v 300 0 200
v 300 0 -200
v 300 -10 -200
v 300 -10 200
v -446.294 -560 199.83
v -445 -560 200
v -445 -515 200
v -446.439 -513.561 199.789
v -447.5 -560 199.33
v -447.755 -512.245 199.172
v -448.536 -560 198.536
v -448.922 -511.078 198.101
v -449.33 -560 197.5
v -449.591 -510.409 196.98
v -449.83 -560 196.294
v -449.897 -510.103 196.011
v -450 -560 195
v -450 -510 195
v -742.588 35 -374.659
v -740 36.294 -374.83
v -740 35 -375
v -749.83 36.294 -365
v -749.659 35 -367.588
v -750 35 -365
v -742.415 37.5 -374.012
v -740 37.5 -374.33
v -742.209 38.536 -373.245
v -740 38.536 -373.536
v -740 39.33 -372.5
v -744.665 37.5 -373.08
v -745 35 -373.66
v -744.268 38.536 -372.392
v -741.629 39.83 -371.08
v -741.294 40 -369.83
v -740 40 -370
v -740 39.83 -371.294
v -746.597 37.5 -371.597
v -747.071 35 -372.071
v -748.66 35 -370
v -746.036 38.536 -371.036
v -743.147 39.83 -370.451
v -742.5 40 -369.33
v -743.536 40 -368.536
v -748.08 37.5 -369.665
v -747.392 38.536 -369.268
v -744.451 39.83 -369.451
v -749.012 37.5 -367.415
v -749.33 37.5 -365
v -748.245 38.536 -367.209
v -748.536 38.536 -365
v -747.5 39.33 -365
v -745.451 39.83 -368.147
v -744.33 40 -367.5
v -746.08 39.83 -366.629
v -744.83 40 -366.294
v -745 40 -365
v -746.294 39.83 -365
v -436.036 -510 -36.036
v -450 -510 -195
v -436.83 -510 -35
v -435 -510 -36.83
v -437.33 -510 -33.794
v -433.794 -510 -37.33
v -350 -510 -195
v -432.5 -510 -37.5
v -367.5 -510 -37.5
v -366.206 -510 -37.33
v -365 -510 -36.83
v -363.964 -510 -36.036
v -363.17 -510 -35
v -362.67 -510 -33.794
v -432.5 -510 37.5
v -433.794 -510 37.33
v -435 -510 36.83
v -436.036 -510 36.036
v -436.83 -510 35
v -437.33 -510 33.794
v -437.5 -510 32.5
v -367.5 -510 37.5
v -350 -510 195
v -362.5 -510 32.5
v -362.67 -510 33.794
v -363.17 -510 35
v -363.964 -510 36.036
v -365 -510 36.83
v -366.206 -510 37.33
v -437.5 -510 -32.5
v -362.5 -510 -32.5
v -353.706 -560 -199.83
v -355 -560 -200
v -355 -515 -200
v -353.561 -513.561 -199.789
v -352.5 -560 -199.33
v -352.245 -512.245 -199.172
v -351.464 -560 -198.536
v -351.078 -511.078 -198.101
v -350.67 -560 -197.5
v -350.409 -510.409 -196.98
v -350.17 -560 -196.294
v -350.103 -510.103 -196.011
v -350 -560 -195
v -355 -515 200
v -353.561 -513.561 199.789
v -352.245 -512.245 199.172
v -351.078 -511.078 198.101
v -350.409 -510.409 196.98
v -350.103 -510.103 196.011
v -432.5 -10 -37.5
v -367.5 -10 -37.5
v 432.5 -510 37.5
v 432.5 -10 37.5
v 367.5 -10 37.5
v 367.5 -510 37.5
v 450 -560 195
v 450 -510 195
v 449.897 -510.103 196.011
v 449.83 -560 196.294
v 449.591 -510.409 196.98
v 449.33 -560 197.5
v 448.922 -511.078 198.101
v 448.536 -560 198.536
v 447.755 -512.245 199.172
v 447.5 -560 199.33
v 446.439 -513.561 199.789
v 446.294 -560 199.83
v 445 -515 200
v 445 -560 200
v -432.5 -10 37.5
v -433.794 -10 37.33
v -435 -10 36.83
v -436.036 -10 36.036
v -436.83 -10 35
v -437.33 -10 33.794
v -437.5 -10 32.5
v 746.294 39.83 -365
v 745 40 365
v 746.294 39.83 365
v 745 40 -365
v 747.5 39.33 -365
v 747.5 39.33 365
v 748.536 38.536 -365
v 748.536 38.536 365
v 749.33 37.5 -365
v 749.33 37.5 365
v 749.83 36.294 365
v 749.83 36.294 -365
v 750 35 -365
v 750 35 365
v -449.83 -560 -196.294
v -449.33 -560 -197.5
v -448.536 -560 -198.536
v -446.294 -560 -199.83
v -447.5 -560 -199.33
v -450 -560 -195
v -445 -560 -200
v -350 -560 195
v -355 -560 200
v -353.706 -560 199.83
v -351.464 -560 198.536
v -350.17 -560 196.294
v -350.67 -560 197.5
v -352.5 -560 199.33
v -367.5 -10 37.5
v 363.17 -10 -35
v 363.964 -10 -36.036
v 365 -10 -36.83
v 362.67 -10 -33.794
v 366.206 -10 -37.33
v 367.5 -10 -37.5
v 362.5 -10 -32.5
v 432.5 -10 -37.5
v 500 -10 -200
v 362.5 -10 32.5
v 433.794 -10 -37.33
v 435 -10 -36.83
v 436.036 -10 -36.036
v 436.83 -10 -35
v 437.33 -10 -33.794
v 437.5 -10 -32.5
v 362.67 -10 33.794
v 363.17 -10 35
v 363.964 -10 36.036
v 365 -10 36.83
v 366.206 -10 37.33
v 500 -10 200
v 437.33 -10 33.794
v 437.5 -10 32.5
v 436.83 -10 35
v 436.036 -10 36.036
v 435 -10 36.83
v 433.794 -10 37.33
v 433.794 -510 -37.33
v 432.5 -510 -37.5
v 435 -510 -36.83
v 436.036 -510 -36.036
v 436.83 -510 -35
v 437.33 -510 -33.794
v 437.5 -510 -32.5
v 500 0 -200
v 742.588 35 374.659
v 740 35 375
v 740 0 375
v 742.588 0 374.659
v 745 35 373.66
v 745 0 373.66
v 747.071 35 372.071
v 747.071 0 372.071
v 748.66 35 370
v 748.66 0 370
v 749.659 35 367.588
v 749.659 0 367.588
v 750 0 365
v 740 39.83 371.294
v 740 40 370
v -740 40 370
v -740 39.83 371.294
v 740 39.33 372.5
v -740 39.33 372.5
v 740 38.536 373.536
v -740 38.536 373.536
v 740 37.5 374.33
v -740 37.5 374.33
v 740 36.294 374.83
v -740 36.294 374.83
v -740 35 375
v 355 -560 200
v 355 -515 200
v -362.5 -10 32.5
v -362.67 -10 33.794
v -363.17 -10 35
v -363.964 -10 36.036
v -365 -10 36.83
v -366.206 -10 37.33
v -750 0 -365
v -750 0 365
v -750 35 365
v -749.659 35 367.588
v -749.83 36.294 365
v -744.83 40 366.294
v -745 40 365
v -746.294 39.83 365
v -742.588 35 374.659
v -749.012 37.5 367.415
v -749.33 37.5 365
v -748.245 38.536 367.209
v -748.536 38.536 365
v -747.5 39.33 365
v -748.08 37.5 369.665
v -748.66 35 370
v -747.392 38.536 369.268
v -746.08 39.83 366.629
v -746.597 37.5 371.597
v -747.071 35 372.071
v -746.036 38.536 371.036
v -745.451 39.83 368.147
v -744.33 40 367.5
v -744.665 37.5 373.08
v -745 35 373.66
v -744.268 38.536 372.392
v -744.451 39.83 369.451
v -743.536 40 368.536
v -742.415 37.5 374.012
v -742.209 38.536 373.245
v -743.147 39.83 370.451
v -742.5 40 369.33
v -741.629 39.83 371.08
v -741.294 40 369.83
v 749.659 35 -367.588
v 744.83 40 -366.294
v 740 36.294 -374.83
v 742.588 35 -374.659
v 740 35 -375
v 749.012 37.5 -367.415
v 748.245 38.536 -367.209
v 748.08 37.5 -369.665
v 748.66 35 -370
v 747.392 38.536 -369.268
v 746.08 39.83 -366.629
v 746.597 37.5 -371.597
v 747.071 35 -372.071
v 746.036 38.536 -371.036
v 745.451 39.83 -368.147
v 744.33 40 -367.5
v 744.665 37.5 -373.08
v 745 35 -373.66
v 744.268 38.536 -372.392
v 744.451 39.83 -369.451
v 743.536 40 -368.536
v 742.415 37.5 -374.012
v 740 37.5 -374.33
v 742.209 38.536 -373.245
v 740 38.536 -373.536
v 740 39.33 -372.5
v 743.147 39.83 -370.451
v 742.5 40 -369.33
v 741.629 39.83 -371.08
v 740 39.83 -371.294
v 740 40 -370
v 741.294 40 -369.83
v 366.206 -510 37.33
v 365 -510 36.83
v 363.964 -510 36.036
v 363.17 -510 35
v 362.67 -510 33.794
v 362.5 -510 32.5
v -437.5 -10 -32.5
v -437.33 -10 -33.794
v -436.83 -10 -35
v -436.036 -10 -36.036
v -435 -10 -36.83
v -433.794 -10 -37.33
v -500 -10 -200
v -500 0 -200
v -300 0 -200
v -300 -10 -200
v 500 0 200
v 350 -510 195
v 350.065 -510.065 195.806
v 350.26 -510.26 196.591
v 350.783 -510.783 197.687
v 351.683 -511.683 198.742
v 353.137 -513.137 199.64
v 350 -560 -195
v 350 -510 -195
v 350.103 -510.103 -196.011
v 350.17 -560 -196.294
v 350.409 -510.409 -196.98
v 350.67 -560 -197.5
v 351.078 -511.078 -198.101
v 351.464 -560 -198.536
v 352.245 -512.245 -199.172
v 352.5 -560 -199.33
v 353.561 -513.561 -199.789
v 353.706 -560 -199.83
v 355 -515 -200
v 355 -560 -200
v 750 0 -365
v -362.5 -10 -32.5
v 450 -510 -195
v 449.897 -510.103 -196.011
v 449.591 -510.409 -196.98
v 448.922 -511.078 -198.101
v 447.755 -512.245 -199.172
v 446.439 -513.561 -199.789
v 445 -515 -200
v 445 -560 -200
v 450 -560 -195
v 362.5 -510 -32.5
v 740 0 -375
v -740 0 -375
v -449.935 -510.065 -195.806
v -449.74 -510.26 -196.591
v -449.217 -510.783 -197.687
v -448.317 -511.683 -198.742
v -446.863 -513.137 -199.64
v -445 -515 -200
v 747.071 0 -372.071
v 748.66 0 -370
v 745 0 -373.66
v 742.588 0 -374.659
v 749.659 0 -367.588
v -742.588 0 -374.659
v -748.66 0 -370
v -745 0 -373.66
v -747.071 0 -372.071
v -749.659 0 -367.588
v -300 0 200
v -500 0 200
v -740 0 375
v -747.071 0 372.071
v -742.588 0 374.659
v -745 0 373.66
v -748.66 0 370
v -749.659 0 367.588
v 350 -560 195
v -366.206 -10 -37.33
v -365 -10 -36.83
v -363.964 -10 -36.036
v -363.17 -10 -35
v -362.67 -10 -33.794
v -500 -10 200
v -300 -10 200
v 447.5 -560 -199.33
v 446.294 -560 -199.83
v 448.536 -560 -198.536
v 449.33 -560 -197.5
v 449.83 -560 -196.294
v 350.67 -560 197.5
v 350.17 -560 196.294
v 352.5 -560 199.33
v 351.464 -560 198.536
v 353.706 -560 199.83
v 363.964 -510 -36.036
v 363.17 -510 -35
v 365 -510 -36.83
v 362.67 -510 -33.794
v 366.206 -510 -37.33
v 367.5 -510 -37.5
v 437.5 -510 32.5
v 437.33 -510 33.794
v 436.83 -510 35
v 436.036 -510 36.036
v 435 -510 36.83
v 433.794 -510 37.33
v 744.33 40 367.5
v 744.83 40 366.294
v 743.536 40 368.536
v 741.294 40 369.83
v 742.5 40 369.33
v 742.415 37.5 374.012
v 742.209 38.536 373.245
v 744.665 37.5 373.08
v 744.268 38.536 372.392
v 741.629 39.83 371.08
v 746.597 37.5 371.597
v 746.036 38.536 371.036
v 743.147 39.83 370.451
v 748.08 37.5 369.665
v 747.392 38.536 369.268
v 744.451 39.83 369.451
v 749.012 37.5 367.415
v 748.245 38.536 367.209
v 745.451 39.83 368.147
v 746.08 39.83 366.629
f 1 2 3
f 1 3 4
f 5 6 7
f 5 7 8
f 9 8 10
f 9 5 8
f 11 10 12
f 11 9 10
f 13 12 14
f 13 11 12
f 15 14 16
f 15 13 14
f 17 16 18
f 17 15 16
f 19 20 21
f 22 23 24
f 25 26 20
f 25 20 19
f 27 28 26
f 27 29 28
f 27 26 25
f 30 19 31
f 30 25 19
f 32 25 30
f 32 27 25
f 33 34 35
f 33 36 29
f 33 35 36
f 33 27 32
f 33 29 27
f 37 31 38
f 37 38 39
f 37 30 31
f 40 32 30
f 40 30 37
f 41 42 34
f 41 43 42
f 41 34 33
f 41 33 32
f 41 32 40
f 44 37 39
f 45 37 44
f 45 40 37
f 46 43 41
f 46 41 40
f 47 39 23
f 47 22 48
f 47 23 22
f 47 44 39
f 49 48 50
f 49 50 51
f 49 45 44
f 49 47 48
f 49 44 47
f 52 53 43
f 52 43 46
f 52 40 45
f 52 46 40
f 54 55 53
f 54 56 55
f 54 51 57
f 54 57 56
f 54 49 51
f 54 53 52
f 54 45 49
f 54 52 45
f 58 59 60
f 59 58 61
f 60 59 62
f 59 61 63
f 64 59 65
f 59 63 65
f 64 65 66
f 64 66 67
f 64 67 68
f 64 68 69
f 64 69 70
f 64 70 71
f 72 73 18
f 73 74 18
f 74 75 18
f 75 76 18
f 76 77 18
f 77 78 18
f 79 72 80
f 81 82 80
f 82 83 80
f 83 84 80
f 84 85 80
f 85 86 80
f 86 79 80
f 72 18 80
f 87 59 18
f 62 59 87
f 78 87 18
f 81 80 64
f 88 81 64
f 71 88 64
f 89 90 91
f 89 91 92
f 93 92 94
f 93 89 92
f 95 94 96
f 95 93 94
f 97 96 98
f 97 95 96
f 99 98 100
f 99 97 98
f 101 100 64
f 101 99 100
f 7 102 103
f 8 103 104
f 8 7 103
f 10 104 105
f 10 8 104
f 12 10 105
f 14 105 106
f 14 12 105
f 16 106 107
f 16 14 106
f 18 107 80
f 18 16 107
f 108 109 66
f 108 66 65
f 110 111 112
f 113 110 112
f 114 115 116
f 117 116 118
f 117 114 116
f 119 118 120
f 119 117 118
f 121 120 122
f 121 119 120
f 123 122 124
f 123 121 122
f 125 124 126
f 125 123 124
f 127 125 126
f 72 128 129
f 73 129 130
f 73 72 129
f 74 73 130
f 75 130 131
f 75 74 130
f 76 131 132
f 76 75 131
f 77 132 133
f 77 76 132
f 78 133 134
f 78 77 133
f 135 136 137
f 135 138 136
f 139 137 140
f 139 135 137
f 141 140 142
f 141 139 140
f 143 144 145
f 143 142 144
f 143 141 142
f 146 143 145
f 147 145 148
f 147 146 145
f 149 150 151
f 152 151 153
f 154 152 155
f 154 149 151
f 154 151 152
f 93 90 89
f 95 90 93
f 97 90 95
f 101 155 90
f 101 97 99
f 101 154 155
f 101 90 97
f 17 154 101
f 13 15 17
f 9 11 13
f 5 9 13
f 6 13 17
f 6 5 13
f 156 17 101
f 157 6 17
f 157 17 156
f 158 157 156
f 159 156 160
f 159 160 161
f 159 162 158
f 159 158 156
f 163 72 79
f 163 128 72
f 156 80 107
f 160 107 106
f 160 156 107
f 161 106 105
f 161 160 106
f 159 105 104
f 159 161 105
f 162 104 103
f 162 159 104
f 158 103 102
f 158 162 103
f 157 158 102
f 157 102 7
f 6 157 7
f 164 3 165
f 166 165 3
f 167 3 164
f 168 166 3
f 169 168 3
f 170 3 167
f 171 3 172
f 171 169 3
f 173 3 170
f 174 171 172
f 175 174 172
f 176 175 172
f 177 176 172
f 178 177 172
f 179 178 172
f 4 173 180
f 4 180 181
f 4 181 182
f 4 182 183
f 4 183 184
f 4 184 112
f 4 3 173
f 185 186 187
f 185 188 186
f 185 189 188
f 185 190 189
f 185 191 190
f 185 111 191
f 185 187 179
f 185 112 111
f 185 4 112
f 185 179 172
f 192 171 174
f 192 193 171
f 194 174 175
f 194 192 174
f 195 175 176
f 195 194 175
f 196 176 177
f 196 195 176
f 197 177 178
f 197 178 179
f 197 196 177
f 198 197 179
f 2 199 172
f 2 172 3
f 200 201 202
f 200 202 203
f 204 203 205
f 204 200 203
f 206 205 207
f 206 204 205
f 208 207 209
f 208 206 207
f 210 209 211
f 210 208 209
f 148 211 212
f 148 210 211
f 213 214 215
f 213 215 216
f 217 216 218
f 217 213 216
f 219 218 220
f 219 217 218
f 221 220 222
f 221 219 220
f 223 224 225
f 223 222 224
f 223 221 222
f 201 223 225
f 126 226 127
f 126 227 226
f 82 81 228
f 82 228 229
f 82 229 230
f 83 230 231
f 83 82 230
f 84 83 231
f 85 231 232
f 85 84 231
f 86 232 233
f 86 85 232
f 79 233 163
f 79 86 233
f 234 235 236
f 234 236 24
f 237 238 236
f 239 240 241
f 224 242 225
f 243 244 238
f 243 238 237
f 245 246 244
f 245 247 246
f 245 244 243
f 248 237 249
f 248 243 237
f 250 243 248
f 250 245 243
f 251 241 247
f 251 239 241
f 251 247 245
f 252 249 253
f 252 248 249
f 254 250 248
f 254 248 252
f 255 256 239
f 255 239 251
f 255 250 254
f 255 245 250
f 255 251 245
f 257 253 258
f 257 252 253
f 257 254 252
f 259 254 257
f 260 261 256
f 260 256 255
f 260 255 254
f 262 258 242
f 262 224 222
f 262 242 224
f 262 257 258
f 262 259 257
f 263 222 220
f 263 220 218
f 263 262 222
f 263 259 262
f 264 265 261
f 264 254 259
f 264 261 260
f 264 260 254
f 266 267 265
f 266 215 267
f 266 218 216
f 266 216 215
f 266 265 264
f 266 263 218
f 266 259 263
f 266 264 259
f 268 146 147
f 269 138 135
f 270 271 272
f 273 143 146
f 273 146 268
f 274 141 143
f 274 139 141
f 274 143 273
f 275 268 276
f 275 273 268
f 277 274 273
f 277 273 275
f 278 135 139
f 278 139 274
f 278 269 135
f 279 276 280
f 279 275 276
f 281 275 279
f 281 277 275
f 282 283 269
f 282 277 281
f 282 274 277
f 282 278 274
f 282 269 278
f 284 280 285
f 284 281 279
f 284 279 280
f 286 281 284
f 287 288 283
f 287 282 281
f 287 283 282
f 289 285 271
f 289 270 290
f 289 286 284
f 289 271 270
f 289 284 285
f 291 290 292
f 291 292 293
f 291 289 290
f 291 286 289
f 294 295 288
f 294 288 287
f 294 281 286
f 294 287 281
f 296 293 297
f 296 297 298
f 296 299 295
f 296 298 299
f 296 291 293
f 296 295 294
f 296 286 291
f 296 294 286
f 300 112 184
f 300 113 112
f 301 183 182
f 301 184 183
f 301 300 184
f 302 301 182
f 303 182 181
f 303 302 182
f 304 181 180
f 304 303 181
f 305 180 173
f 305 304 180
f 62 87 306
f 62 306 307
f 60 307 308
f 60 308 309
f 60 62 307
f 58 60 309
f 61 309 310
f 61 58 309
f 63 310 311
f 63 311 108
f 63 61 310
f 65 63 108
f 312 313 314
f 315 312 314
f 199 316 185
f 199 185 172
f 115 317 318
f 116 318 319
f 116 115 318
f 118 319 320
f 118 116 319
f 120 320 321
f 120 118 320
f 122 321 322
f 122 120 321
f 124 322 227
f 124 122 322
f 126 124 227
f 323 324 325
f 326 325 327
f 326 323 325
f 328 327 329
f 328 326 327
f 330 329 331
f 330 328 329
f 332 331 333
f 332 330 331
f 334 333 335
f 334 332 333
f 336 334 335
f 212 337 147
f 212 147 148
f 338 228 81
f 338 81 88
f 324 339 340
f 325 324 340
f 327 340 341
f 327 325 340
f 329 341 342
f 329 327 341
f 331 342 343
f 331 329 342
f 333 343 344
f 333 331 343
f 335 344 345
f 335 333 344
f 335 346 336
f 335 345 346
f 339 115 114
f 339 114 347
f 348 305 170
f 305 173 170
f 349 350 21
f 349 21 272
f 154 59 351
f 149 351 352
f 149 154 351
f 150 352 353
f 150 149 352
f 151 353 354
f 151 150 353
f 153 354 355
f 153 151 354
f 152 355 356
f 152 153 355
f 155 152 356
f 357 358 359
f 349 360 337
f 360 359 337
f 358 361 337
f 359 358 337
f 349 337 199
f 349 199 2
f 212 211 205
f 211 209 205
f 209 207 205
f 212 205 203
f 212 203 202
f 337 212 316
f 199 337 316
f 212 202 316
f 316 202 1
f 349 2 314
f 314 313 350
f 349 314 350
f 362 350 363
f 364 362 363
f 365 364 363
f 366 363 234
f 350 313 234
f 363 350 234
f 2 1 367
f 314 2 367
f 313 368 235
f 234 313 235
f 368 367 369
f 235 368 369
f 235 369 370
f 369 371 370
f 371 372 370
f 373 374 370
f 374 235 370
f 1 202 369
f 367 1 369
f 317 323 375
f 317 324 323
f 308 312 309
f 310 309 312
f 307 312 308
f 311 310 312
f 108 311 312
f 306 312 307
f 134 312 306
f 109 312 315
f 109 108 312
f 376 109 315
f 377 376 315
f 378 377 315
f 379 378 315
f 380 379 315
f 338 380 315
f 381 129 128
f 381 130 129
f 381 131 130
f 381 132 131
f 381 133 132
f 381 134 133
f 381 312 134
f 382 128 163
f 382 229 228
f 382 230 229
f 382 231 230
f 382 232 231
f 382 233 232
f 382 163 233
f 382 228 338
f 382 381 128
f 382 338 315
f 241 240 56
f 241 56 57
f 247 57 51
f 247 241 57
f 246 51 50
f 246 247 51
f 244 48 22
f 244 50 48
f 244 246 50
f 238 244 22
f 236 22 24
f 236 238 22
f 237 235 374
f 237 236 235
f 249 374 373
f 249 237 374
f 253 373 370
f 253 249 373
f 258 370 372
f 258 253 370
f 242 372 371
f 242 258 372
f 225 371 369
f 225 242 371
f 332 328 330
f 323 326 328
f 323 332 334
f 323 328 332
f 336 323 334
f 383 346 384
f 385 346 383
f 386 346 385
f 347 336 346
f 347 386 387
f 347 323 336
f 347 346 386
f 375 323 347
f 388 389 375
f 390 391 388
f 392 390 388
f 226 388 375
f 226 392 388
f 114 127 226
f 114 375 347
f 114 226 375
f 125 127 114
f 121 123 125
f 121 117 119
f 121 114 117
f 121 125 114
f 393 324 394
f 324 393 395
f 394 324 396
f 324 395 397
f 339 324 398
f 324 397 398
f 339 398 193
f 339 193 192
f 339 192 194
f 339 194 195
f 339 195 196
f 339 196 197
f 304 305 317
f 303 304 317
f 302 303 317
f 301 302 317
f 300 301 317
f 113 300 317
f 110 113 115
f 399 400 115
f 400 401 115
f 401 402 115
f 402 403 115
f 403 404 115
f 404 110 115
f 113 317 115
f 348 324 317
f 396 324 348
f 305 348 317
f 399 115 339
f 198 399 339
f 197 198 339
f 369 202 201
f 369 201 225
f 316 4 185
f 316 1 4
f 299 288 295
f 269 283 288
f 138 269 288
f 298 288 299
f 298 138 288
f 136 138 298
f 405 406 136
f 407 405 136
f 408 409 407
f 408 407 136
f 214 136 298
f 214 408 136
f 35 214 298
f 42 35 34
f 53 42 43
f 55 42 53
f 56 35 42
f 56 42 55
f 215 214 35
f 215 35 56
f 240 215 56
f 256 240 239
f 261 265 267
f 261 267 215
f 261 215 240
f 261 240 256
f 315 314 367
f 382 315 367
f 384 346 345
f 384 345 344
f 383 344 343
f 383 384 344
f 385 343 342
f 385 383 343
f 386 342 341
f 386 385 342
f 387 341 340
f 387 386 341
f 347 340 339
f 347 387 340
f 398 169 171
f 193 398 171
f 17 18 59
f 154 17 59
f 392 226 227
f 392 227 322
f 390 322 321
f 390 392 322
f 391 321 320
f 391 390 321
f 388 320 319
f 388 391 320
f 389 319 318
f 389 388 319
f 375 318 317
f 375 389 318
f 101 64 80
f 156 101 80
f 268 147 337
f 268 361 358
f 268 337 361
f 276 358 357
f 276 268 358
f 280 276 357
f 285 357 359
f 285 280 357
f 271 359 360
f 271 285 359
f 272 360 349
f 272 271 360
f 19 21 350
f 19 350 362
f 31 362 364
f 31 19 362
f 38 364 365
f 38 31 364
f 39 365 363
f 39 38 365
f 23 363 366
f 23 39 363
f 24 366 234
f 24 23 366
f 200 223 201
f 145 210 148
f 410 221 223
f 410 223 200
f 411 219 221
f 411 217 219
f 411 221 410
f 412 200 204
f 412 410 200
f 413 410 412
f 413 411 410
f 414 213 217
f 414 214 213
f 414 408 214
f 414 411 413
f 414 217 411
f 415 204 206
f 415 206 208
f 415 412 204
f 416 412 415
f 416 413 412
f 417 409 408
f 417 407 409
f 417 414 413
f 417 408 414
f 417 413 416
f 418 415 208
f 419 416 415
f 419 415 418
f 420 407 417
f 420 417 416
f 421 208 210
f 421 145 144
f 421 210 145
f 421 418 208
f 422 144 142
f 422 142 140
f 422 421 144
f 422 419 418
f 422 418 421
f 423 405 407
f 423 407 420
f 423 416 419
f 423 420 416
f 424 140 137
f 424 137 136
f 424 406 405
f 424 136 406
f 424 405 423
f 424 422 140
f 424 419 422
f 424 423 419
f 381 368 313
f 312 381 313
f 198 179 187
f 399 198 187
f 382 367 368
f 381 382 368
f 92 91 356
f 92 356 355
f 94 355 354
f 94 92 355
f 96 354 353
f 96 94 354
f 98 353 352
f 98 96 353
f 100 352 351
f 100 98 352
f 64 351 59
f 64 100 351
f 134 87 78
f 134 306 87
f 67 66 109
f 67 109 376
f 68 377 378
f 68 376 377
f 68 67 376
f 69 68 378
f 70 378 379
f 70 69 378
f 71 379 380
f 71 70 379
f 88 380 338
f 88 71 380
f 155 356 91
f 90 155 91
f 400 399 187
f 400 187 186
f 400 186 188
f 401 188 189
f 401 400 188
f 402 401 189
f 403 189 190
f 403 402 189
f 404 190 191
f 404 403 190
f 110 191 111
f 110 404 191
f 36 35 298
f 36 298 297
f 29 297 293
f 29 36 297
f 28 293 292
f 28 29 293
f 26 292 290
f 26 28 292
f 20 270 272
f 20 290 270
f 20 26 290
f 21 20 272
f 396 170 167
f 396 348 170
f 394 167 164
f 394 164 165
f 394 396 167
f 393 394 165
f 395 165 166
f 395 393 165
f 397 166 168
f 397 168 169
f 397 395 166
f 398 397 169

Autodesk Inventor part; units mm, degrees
ref_plane "YZ Plane" through (0, 0, 0) normal (1, 0, 0) x (0, 1, 0)
ref_plane "XZ Plane" through (0, 0, 0) normal (0, 1, 0) x (-1, 0, 0)
ref_plane "XY Plane" through (0, 0, 0) normal (0, 0, 1) x (1, 0, 0)
sketch "Sketch1" plane through (0, 0, 0) normal (0, 1, 0) x (-1, 0, 0)
  line L0 (750, -375) -> (-750, -375)
  line L1 (-750, -375) -> (-750, 375)
  line L2 (-750, 375) -> (750, 375)
  line L3 (750, 375) -> (750, -375)
  line L4 (0, 0) -> (-250, 0) construction
  line L5 (0, 0) -> (0, -250) construction
  dimension "d0" = 1500
  dimension "d1" = 750
  dimension "d2" = 250
  dimension "d3" = 250
extrude "Extrusion1" add sketch "Sketch1" along normal blind 40
fillet "Fillet1" radius 10 4 edges at (750, 20, 375) (750, 20, -375) (-750, 20, -375) (-750, 20, 375)
fillet "Fillet2" radius 5 8 edges at (-747.0711, 40, -372.0711) (-750, 40, 0) (-747.0711, 40, 372.0711) (0, 40, 375) (747.0711, 40, 372.0711) (750, 40, 0) (747.0711, 40, -372.0711) (0, 40, -375)
sketch "Sketch2" plane through (0, 0, 0) normal (0, -1, 0) x (1, 0, 0)
  line L0 (0, 0) -> (400, 0) construction
  line L1 (750, -365) -> (750, 365) construction
  line L2 (300, 200) -> (500, 200)
  line L3 (500, 200) -> (500, -200)
  line L4 (500, -200) -> (300, -200)
  line L5 (300, -200) -> (300, 200)
  line L6 (400, 0) -> (400, -100) construction
  line L7 (0, 0) -> (0, 100) construction
  line L8 (-300, 200) -> (-500, 200)
  line L9 (-500, 200) -> (-500, -200)
  line L10 (-500, -200) -> (-300, -200)
  line L11 (-300, -200) -> (-300, 200)
  dimension "d8" = 400
  dimension "d10" = 200
  dimension "d11" = 400
  dimension "d14" = 100
  dimension "d15" = 100
extrude "Extrusion2" add sketch "Sketch2" along normal blind 10
sketch "Sketch3" plane through (0, -10, 0) normal (0, -1, 0) x (1, 0, 0)
  line L0 (0, 0) -> (400, 0) construction
  line L1 (400, 0) -> (400, 100) construction
  line L2 (362.5, -37.5) -> (437.5, -37.5)
  line L3 (437.5, -37.5) -> (437.5, 37.5)
  line L4 (437.5, 37.5) -> (362.5, 37.5)
  line L5 (362.5, 37.5) -> (362.5, -37.5)
  line L6 (0, 0) -> (0, 100) construction
  line L7 (-362.5, -37.5) -> (-437.5, -37.5)
  line L8 (-437.5, -37.5) -> (-437.5, 37.5)
  line L9 (-437.5, 37.5) -> (-362.5, 37.5)
  line L10 (-362.5, 37.5) -> (-362.5, -37.5)
  dimension "d18" = 400
  dimension "d19" = 100
  dimension "d20" = 75
  dimension "d21" = 75
  dimension "d22" = 100
extrude "Extrusion3" add sketch "Sketch3" along normal blind 500
sketch "Sketch4" plane through (0, -510, 0) normal (0, -1, 0) x (1, 0, 0)
  line L0 (0, 0) -> (400, 0) construction
  line L1 (400, 0) -> (400, 100) construction
  line L2 (400, 0) -> (400, -100) construction
  line L3 (350, 200) -> (450, 200)
  line L4 (450, 200) -> (450, -200)
  line L5 (450, -200) -> (350, -200)
  line L6 (350, -200) -> (350, 200)
  line L7 (0, 0) -> (0, 100) construction
  line L8 (-350, 200) -> (-450, 200)
  line L9 (-450, 200) -> (-450, -200)
  line L10 (-450, -200) -> (-350, -200)
  line L11 (-350, -200) -> (-350, 200)
  dimension "d25" = 400
  dimension "d26" = 100
  dimension "d27" = 100
  dimension "d28" = 100
  dimension "d29" = 400
  dimension "d30" = 100
extrude "Extrusion4" add sketch "Sketch4" along normal blind 50
fillet "Fillet3" radius 5 8 edges at (437.5, -260, -37.5) (362.5, -260, -37.5) (437.5, -260, 37.5) (-362.5, -260, -37.5) (-362.5, -260, 37.5) (-437.5, -260, -37.5) (362.5, -260, 37.5) (-437.5, -260, 37.5)
fillet "Fillet4" radius 5 12 edges at (-400, -510, 200) (-450, -535, 200) (-350, -535, 200) (350, -535, 200) (400, -510, 200) (450, -535, 200) (350, -535, -200) (-450, -535, -200) (-400, -510, -200) (-350, -535, -200) (400, -510, -200) (450, -535, -200)
properties part number "Table"
